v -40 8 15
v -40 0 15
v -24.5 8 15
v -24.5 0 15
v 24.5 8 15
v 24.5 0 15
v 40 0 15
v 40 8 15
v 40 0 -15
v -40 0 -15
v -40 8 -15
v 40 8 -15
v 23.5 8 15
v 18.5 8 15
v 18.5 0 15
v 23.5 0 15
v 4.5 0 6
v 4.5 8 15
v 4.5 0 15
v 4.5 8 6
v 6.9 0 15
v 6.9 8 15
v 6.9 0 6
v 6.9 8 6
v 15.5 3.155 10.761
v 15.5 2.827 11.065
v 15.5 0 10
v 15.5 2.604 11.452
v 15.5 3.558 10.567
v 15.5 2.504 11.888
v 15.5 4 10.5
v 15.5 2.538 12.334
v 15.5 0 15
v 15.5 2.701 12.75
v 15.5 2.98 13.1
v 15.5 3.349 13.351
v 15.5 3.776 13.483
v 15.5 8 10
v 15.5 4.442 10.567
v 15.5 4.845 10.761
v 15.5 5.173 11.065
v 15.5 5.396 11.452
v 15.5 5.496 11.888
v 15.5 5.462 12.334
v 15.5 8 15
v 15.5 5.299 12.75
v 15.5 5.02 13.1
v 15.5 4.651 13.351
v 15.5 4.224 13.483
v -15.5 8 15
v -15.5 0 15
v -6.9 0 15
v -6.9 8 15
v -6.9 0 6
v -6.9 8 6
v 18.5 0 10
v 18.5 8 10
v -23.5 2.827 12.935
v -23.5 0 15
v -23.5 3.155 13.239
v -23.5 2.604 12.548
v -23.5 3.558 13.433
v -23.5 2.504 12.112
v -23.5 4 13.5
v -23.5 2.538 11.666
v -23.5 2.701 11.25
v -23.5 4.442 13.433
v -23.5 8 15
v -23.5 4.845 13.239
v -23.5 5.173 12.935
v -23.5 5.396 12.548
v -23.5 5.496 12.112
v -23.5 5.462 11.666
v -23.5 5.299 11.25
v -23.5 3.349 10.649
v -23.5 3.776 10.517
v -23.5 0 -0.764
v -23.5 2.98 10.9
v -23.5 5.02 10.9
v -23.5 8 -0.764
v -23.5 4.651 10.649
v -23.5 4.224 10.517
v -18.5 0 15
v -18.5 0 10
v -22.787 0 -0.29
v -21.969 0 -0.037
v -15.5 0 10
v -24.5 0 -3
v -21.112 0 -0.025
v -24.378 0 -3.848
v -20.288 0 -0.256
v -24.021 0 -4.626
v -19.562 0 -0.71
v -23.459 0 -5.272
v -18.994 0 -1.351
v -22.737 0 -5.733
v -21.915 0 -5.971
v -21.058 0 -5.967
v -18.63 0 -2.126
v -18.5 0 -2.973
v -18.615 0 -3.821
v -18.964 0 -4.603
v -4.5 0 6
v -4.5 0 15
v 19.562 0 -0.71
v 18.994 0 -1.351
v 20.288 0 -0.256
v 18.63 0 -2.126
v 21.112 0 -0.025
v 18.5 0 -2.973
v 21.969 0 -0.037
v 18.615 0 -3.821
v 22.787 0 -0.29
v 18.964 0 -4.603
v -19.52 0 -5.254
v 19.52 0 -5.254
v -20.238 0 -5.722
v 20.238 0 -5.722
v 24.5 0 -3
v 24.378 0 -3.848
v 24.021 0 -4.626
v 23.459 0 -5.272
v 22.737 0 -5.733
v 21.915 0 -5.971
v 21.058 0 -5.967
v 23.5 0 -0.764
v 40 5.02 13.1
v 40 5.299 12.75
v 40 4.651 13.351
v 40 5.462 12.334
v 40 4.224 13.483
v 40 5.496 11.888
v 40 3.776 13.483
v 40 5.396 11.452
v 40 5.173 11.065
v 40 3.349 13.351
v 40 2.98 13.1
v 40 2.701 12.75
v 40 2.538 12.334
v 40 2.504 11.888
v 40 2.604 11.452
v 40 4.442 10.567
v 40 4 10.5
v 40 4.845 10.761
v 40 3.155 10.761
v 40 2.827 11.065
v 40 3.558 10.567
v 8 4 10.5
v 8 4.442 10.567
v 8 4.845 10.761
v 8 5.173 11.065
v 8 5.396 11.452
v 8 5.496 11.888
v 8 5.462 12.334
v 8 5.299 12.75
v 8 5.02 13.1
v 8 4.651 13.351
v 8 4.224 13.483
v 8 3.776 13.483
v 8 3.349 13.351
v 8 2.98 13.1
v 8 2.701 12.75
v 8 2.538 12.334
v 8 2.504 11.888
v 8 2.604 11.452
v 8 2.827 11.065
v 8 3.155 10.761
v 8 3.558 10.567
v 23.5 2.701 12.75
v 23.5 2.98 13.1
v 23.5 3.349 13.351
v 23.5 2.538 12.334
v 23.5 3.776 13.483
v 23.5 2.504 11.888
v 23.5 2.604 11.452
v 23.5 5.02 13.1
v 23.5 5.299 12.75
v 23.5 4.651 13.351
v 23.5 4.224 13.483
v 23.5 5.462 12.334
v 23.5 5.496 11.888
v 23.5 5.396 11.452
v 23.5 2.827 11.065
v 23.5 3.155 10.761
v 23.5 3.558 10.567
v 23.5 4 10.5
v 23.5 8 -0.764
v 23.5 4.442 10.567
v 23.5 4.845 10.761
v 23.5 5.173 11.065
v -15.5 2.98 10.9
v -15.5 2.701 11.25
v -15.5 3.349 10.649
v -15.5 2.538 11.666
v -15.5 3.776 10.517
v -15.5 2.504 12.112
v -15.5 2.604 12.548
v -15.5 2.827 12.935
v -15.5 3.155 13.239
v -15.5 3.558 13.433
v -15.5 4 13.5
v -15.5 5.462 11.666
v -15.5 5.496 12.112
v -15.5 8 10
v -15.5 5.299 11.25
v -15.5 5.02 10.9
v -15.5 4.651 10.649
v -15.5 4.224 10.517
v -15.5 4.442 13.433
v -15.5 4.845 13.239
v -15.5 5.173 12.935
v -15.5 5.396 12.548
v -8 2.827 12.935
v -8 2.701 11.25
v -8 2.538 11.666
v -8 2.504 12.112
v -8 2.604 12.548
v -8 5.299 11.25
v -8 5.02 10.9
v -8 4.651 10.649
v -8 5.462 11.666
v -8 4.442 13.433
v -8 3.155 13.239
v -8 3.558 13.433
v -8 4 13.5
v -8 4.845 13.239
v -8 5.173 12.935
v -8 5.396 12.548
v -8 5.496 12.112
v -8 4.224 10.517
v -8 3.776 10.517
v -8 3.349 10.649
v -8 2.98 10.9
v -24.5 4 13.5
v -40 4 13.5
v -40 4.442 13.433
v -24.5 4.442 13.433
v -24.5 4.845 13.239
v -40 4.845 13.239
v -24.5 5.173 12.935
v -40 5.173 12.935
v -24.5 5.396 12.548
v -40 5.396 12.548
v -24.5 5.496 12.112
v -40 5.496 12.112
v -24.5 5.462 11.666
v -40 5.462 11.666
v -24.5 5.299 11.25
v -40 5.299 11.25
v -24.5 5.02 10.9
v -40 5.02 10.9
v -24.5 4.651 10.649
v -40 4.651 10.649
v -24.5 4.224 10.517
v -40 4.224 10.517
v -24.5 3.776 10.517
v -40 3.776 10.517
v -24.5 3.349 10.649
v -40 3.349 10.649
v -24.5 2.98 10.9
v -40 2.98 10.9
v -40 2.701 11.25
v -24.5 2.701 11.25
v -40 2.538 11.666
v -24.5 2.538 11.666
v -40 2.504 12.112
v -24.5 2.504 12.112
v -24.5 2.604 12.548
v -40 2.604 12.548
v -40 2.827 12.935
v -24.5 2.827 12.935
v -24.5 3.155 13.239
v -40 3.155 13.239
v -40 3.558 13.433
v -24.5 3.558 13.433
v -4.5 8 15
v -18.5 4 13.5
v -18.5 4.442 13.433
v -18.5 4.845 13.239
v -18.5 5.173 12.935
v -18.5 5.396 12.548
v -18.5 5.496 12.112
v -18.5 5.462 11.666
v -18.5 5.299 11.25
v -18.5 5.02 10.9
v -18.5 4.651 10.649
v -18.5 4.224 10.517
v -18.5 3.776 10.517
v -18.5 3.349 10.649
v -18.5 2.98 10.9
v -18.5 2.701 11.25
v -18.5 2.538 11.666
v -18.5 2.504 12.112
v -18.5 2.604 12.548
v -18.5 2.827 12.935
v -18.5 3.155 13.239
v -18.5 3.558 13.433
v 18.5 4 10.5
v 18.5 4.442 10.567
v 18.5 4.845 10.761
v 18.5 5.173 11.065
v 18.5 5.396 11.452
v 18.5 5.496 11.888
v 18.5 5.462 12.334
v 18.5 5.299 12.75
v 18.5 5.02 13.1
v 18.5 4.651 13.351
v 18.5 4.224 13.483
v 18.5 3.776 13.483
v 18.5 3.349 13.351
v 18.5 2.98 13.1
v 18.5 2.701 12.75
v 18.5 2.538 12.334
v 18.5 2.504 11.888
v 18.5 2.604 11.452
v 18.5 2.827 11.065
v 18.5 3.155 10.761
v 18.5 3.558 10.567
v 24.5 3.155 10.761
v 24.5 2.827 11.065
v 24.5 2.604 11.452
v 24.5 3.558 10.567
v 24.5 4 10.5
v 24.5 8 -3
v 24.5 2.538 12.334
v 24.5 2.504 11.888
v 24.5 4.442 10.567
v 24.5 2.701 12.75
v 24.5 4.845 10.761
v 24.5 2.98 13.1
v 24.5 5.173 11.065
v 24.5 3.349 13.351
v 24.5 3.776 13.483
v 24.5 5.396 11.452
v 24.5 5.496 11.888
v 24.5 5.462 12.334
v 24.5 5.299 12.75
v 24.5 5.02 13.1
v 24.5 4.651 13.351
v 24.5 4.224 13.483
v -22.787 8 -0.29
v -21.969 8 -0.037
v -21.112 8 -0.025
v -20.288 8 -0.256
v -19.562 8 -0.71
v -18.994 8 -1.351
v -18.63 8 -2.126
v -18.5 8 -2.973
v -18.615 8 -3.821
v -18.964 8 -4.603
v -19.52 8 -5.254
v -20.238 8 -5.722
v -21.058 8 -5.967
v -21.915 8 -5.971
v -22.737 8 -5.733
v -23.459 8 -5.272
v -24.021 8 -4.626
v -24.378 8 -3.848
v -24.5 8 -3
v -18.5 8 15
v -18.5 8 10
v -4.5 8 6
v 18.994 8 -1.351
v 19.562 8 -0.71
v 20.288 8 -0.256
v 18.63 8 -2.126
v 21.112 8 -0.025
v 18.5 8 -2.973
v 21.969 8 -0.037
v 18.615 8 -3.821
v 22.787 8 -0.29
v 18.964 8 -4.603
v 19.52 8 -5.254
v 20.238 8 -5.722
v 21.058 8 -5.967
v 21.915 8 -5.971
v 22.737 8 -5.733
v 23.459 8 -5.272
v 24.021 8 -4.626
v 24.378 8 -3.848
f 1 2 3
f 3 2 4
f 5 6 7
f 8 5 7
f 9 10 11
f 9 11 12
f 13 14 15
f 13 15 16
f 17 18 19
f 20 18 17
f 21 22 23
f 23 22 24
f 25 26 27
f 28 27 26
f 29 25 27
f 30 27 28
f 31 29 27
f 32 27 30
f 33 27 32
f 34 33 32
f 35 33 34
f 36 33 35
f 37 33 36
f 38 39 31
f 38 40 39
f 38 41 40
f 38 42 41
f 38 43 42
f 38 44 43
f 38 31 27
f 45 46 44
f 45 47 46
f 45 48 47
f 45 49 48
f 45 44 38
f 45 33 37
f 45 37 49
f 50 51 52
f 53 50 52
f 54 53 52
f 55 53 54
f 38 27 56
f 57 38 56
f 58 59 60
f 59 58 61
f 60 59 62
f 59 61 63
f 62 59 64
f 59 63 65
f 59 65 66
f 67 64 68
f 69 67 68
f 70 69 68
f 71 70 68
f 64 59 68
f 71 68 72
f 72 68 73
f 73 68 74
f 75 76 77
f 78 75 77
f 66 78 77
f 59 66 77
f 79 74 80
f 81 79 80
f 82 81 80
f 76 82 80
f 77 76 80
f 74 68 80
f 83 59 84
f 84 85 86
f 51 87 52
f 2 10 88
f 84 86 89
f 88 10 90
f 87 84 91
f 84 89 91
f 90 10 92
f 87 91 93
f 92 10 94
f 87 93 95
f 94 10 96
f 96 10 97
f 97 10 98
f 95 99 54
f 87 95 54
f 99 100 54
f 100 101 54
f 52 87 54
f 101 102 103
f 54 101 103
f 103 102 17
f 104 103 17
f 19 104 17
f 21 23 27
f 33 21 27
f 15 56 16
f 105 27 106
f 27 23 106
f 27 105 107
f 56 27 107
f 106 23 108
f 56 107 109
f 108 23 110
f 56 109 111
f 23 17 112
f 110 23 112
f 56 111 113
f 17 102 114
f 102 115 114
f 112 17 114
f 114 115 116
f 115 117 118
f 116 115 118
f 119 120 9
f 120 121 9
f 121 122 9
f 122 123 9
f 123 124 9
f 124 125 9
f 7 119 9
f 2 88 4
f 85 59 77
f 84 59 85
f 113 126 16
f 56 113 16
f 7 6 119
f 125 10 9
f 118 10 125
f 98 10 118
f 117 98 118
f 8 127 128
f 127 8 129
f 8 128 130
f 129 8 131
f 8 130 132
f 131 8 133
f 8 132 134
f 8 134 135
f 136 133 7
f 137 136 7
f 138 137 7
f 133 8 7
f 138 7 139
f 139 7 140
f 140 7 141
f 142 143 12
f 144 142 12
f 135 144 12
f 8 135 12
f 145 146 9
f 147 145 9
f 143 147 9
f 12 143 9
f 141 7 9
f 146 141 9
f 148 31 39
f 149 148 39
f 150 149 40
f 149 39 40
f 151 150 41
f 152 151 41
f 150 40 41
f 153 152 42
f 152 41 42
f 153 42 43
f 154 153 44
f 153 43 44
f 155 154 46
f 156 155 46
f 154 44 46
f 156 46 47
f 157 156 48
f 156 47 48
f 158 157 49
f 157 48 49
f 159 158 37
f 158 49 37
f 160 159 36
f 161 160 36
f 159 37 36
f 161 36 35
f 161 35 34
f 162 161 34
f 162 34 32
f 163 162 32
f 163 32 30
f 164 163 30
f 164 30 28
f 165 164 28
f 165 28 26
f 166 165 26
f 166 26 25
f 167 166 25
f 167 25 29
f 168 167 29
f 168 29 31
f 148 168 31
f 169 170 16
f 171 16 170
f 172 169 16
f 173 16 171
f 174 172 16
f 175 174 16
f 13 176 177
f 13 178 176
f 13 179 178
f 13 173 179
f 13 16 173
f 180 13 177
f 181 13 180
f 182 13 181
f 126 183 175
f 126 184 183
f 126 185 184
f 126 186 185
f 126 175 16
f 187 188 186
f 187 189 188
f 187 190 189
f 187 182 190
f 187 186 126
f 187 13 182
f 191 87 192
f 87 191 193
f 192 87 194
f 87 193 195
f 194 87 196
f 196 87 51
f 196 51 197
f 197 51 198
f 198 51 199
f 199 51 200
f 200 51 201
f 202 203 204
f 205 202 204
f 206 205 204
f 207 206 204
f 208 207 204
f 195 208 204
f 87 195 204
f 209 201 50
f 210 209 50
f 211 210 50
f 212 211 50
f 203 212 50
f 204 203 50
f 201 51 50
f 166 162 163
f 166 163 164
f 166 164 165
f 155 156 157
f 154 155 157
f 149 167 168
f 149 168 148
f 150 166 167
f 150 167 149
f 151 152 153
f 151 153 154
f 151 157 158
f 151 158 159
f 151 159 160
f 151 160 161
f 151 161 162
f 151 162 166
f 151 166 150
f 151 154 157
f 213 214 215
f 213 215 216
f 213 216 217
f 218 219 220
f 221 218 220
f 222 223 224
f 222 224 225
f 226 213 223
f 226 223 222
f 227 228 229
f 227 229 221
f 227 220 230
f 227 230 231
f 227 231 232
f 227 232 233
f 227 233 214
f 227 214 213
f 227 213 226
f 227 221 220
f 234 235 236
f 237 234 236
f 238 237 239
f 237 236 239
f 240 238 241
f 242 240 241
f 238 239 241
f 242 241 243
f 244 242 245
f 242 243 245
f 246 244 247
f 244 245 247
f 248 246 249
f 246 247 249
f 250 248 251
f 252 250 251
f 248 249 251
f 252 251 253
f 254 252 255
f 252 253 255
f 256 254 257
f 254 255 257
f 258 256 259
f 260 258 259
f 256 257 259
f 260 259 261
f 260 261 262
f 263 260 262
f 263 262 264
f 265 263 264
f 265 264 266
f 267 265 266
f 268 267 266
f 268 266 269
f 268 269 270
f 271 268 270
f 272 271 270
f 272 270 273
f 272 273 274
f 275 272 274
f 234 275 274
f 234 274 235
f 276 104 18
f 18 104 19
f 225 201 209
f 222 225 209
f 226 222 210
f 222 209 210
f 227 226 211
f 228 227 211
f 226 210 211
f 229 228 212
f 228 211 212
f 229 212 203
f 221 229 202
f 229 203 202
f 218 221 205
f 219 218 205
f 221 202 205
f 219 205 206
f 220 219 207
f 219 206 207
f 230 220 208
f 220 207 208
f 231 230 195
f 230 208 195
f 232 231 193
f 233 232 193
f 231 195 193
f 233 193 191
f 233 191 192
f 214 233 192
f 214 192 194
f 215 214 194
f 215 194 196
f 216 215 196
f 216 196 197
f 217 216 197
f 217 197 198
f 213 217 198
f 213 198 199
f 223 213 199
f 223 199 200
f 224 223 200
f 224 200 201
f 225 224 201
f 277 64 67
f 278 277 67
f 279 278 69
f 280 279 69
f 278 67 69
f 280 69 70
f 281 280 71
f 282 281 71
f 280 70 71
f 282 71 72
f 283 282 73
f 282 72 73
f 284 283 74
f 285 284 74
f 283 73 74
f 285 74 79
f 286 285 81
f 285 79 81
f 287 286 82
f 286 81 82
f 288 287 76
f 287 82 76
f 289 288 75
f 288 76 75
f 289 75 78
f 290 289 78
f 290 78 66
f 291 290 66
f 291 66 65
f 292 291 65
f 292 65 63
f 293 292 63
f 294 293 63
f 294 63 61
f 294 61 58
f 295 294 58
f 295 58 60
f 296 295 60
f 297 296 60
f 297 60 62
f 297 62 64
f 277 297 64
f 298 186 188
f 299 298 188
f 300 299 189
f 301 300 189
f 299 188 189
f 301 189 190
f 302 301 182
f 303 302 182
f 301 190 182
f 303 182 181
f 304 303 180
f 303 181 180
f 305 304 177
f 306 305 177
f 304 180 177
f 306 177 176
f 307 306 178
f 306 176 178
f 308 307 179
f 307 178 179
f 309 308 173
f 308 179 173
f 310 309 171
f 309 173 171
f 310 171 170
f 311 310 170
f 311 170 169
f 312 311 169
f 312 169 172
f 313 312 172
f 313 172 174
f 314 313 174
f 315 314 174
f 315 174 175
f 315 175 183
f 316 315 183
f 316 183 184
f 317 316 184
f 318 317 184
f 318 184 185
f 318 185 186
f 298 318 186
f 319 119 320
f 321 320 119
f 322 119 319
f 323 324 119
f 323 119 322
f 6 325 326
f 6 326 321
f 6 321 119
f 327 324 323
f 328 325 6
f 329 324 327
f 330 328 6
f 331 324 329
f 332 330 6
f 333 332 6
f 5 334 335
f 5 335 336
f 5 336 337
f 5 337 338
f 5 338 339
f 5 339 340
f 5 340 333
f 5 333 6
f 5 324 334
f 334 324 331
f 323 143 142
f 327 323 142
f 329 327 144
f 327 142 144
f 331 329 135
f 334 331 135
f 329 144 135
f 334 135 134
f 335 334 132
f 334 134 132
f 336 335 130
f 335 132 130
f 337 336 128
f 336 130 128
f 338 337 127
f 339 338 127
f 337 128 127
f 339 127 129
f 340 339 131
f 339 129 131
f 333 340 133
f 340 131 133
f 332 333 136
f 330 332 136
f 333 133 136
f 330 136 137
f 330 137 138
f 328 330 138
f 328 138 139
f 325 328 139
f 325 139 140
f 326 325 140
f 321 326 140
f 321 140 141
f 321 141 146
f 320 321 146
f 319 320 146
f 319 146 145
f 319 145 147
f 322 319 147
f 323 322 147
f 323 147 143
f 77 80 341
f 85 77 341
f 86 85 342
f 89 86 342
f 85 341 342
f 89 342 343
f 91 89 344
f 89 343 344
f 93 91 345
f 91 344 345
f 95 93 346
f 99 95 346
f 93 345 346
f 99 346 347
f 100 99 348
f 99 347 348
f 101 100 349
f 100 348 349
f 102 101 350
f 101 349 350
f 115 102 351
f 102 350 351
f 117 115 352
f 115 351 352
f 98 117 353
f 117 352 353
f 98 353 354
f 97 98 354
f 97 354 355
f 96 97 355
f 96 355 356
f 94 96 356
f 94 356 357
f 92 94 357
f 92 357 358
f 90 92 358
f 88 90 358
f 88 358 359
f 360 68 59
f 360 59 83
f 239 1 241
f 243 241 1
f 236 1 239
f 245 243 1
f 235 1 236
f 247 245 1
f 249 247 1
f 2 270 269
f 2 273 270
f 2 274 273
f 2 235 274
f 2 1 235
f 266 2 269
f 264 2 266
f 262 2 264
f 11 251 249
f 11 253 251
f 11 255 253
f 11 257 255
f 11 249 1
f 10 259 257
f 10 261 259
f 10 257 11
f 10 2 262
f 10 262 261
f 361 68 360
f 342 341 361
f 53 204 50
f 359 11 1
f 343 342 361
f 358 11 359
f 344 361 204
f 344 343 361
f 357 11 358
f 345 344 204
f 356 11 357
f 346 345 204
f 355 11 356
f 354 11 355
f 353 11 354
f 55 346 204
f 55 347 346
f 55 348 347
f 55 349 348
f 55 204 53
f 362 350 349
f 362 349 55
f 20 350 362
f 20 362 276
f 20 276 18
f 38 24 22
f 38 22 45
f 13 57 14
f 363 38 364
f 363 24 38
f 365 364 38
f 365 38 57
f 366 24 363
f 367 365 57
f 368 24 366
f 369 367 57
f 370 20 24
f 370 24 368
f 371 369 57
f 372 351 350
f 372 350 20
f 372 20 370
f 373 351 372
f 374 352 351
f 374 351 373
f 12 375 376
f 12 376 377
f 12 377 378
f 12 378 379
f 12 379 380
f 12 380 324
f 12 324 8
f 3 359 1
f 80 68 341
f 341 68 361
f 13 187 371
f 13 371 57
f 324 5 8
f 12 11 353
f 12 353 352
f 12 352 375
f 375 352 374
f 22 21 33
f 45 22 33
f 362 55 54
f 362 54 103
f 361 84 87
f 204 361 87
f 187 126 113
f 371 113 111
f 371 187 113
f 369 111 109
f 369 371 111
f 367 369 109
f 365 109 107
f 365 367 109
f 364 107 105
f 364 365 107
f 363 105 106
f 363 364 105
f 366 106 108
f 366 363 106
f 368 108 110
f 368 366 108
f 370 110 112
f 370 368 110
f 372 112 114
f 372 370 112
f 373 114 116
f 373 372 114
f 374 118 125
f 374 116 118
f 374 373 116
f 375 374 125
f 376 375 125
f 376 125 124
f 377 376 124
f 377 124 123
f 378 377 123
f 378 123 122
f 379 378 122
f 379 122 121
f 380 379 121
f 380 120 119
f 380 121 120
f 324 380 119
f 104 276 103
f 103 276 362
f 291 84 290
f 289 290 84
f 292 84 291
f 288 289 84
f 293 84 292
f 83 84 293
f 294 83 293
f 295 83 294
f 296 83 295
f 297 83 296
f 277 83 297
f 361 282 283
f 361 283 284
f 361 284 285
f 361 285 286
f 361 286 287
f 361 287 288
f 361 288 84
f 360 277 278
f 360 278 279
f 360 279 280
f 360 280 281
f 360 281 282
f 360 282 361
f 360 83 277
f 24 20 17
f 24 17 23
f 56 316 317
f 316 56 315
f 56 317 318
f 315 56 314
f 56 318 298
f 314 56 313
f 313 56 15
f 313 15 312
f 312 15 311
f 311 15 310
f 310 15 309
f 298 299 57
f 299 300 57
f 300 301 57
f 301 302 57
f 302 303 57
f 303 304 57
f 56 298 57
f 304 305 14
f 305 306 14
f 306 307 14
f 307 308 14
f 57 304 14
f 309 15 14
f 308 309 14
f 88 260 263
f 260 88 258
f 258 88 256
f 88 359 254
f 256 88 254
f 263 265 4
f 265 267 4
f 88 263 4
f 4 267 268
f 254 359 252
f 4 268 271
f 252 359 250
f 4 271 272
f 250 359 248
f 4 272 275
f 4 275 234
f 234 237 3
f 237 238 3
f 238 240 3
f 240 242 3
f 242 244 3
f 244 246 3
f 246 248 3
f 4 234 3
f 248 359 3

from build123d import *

# Parameters (mm, degrees)
SKETCH_1_W               = 80
SKETCH_1_H               = 30
EXTRUDE_1_DEPTH          = 8
CUT_EXTRUDE_1_DEPTH      = 9
SKETCH_3_W               = 2.4
SKETCH_3_H               = 9
CUT_EXTRUDE_2_DEPTH      = 1
CUT_EXTRUDE_2_DEPTH_BACK = 9
SKETCH_5_R               = 1.5
CUT_EXTRUDE_3_DEPTH      = 32
SKETCH_6_W               = 3
SKETCH_6_H               = 8
CUT_EXTRUDE_5_DEPTH      = 5
SKETCH_7_R               = 1.5
CUT_EXTRUDE_6_DEPTH      = 32


with BuildPart() as part:
    # 草图1 → 凸台-拉伸1 (new body)
    with BuildSketch(Plane(origin=(0, 0, 0), x_dir=(1, 0, 0), z_dir=(0, 1, 0))):
        Rectangle(SKETCH_1_W, SKETCH_1_H)
    extrude(amount=EXTRUDE_1_DEPTH)

    # 草图2 → 切除-拉伸1 (cut, through all)
    with BuildSketch(Plane(origin=(0, 8, 0), x_dir=(1, 0, 0), z_dir=(0, 1, 0))):
        with BuildLine():
            Line((-24.5, 3), (-24.5, -15))
            Line((-24.5, -15), (-23.5, -15))
            Line((-23.5, -15), (-23.5, 0.763932023))
            ThreePointArc((-23.5, 0.763932023), (-18.761387212, 4.224744871), (-24.5, 3))
        make_face()
        with BuildLine():
            Line((23.5, -15), (23.5, 0.763932023))
            ThreePointArc((23.5, 0.763932023), (18.761387212, 4.224744871), (24.5, 3))
            Line((24.5, 3), (24.5, -15))
            Line((24.5, -15), (23.5, -15))
        make_face()
    extrude(amount=-CUT_EXTRUDE_1_DEPTH, mode=Mode.SUBTRACT)

    # 草图3 → 切除-拉伸2 (cut, two sides)
    with BuildSketch(Plane(origin=(0, 8, 0), x_dir=(1, 0, 0), z_dir=(0, 1, 0))) as cut_extrude_2_sk:
        with Locations((-5.7, -10.5)):
            Rectangle(SKETCH_3_W, SKETCH_3_H)
        with Locations((5.7, -10.5)):
            Rectangle(SKETCH_3_W, SKETCH_3_H)
    extrude(amount=CUT_EXTRUDE_2_DEPTH, mode=Mode.SUBTRACT)
    extrude(cut_extrude_2_sk.sketch, amount=-CUT_EXTRUDE_2_DEPTH_BACK, mode=Mode.SUBTRACT)

    # 草图5 → 切除-拉伸3 (cut)
    with BuildSketch(Plane.ZY.offset(40)):
        with Locations((12, 4)):
            Circle(SKETCH_5_R)
    extrude(amount=-CUT_EXTRUDE_3_DEPTH, mode=Mode.SUBTRACT)

    # 草图6 → 切除-拉伸5 (cut)
    with BuildSketch(Plane.XY.offset(15)):
        with Locations((-17, 4)):
            Rectangle(SKETCH_6_W, SKETCH_6_H)
        with Locations((17, 4)):
            Rectangle(SKETCH_6_W, SKETCH_6_H)
    extrude(amount=-CUT_EXTRUDE_5_DEPTH, mode=Mode.SUBTRACT)

    # 草图7 → 切除-拉伸6 (cut)
    with BuildSketch(Plane(origin=(40, 0, 0), x_dir=(0, 0, -1), z_dir=(1, 0, 0))):
        with Locations((-12, 4)):
            Circle(SKETCH_7_R)
    extrude(amount=-CUT_EXTRUDE_6_DEPTH, mode=Mode.SUBTRACT)


solid = part.part
